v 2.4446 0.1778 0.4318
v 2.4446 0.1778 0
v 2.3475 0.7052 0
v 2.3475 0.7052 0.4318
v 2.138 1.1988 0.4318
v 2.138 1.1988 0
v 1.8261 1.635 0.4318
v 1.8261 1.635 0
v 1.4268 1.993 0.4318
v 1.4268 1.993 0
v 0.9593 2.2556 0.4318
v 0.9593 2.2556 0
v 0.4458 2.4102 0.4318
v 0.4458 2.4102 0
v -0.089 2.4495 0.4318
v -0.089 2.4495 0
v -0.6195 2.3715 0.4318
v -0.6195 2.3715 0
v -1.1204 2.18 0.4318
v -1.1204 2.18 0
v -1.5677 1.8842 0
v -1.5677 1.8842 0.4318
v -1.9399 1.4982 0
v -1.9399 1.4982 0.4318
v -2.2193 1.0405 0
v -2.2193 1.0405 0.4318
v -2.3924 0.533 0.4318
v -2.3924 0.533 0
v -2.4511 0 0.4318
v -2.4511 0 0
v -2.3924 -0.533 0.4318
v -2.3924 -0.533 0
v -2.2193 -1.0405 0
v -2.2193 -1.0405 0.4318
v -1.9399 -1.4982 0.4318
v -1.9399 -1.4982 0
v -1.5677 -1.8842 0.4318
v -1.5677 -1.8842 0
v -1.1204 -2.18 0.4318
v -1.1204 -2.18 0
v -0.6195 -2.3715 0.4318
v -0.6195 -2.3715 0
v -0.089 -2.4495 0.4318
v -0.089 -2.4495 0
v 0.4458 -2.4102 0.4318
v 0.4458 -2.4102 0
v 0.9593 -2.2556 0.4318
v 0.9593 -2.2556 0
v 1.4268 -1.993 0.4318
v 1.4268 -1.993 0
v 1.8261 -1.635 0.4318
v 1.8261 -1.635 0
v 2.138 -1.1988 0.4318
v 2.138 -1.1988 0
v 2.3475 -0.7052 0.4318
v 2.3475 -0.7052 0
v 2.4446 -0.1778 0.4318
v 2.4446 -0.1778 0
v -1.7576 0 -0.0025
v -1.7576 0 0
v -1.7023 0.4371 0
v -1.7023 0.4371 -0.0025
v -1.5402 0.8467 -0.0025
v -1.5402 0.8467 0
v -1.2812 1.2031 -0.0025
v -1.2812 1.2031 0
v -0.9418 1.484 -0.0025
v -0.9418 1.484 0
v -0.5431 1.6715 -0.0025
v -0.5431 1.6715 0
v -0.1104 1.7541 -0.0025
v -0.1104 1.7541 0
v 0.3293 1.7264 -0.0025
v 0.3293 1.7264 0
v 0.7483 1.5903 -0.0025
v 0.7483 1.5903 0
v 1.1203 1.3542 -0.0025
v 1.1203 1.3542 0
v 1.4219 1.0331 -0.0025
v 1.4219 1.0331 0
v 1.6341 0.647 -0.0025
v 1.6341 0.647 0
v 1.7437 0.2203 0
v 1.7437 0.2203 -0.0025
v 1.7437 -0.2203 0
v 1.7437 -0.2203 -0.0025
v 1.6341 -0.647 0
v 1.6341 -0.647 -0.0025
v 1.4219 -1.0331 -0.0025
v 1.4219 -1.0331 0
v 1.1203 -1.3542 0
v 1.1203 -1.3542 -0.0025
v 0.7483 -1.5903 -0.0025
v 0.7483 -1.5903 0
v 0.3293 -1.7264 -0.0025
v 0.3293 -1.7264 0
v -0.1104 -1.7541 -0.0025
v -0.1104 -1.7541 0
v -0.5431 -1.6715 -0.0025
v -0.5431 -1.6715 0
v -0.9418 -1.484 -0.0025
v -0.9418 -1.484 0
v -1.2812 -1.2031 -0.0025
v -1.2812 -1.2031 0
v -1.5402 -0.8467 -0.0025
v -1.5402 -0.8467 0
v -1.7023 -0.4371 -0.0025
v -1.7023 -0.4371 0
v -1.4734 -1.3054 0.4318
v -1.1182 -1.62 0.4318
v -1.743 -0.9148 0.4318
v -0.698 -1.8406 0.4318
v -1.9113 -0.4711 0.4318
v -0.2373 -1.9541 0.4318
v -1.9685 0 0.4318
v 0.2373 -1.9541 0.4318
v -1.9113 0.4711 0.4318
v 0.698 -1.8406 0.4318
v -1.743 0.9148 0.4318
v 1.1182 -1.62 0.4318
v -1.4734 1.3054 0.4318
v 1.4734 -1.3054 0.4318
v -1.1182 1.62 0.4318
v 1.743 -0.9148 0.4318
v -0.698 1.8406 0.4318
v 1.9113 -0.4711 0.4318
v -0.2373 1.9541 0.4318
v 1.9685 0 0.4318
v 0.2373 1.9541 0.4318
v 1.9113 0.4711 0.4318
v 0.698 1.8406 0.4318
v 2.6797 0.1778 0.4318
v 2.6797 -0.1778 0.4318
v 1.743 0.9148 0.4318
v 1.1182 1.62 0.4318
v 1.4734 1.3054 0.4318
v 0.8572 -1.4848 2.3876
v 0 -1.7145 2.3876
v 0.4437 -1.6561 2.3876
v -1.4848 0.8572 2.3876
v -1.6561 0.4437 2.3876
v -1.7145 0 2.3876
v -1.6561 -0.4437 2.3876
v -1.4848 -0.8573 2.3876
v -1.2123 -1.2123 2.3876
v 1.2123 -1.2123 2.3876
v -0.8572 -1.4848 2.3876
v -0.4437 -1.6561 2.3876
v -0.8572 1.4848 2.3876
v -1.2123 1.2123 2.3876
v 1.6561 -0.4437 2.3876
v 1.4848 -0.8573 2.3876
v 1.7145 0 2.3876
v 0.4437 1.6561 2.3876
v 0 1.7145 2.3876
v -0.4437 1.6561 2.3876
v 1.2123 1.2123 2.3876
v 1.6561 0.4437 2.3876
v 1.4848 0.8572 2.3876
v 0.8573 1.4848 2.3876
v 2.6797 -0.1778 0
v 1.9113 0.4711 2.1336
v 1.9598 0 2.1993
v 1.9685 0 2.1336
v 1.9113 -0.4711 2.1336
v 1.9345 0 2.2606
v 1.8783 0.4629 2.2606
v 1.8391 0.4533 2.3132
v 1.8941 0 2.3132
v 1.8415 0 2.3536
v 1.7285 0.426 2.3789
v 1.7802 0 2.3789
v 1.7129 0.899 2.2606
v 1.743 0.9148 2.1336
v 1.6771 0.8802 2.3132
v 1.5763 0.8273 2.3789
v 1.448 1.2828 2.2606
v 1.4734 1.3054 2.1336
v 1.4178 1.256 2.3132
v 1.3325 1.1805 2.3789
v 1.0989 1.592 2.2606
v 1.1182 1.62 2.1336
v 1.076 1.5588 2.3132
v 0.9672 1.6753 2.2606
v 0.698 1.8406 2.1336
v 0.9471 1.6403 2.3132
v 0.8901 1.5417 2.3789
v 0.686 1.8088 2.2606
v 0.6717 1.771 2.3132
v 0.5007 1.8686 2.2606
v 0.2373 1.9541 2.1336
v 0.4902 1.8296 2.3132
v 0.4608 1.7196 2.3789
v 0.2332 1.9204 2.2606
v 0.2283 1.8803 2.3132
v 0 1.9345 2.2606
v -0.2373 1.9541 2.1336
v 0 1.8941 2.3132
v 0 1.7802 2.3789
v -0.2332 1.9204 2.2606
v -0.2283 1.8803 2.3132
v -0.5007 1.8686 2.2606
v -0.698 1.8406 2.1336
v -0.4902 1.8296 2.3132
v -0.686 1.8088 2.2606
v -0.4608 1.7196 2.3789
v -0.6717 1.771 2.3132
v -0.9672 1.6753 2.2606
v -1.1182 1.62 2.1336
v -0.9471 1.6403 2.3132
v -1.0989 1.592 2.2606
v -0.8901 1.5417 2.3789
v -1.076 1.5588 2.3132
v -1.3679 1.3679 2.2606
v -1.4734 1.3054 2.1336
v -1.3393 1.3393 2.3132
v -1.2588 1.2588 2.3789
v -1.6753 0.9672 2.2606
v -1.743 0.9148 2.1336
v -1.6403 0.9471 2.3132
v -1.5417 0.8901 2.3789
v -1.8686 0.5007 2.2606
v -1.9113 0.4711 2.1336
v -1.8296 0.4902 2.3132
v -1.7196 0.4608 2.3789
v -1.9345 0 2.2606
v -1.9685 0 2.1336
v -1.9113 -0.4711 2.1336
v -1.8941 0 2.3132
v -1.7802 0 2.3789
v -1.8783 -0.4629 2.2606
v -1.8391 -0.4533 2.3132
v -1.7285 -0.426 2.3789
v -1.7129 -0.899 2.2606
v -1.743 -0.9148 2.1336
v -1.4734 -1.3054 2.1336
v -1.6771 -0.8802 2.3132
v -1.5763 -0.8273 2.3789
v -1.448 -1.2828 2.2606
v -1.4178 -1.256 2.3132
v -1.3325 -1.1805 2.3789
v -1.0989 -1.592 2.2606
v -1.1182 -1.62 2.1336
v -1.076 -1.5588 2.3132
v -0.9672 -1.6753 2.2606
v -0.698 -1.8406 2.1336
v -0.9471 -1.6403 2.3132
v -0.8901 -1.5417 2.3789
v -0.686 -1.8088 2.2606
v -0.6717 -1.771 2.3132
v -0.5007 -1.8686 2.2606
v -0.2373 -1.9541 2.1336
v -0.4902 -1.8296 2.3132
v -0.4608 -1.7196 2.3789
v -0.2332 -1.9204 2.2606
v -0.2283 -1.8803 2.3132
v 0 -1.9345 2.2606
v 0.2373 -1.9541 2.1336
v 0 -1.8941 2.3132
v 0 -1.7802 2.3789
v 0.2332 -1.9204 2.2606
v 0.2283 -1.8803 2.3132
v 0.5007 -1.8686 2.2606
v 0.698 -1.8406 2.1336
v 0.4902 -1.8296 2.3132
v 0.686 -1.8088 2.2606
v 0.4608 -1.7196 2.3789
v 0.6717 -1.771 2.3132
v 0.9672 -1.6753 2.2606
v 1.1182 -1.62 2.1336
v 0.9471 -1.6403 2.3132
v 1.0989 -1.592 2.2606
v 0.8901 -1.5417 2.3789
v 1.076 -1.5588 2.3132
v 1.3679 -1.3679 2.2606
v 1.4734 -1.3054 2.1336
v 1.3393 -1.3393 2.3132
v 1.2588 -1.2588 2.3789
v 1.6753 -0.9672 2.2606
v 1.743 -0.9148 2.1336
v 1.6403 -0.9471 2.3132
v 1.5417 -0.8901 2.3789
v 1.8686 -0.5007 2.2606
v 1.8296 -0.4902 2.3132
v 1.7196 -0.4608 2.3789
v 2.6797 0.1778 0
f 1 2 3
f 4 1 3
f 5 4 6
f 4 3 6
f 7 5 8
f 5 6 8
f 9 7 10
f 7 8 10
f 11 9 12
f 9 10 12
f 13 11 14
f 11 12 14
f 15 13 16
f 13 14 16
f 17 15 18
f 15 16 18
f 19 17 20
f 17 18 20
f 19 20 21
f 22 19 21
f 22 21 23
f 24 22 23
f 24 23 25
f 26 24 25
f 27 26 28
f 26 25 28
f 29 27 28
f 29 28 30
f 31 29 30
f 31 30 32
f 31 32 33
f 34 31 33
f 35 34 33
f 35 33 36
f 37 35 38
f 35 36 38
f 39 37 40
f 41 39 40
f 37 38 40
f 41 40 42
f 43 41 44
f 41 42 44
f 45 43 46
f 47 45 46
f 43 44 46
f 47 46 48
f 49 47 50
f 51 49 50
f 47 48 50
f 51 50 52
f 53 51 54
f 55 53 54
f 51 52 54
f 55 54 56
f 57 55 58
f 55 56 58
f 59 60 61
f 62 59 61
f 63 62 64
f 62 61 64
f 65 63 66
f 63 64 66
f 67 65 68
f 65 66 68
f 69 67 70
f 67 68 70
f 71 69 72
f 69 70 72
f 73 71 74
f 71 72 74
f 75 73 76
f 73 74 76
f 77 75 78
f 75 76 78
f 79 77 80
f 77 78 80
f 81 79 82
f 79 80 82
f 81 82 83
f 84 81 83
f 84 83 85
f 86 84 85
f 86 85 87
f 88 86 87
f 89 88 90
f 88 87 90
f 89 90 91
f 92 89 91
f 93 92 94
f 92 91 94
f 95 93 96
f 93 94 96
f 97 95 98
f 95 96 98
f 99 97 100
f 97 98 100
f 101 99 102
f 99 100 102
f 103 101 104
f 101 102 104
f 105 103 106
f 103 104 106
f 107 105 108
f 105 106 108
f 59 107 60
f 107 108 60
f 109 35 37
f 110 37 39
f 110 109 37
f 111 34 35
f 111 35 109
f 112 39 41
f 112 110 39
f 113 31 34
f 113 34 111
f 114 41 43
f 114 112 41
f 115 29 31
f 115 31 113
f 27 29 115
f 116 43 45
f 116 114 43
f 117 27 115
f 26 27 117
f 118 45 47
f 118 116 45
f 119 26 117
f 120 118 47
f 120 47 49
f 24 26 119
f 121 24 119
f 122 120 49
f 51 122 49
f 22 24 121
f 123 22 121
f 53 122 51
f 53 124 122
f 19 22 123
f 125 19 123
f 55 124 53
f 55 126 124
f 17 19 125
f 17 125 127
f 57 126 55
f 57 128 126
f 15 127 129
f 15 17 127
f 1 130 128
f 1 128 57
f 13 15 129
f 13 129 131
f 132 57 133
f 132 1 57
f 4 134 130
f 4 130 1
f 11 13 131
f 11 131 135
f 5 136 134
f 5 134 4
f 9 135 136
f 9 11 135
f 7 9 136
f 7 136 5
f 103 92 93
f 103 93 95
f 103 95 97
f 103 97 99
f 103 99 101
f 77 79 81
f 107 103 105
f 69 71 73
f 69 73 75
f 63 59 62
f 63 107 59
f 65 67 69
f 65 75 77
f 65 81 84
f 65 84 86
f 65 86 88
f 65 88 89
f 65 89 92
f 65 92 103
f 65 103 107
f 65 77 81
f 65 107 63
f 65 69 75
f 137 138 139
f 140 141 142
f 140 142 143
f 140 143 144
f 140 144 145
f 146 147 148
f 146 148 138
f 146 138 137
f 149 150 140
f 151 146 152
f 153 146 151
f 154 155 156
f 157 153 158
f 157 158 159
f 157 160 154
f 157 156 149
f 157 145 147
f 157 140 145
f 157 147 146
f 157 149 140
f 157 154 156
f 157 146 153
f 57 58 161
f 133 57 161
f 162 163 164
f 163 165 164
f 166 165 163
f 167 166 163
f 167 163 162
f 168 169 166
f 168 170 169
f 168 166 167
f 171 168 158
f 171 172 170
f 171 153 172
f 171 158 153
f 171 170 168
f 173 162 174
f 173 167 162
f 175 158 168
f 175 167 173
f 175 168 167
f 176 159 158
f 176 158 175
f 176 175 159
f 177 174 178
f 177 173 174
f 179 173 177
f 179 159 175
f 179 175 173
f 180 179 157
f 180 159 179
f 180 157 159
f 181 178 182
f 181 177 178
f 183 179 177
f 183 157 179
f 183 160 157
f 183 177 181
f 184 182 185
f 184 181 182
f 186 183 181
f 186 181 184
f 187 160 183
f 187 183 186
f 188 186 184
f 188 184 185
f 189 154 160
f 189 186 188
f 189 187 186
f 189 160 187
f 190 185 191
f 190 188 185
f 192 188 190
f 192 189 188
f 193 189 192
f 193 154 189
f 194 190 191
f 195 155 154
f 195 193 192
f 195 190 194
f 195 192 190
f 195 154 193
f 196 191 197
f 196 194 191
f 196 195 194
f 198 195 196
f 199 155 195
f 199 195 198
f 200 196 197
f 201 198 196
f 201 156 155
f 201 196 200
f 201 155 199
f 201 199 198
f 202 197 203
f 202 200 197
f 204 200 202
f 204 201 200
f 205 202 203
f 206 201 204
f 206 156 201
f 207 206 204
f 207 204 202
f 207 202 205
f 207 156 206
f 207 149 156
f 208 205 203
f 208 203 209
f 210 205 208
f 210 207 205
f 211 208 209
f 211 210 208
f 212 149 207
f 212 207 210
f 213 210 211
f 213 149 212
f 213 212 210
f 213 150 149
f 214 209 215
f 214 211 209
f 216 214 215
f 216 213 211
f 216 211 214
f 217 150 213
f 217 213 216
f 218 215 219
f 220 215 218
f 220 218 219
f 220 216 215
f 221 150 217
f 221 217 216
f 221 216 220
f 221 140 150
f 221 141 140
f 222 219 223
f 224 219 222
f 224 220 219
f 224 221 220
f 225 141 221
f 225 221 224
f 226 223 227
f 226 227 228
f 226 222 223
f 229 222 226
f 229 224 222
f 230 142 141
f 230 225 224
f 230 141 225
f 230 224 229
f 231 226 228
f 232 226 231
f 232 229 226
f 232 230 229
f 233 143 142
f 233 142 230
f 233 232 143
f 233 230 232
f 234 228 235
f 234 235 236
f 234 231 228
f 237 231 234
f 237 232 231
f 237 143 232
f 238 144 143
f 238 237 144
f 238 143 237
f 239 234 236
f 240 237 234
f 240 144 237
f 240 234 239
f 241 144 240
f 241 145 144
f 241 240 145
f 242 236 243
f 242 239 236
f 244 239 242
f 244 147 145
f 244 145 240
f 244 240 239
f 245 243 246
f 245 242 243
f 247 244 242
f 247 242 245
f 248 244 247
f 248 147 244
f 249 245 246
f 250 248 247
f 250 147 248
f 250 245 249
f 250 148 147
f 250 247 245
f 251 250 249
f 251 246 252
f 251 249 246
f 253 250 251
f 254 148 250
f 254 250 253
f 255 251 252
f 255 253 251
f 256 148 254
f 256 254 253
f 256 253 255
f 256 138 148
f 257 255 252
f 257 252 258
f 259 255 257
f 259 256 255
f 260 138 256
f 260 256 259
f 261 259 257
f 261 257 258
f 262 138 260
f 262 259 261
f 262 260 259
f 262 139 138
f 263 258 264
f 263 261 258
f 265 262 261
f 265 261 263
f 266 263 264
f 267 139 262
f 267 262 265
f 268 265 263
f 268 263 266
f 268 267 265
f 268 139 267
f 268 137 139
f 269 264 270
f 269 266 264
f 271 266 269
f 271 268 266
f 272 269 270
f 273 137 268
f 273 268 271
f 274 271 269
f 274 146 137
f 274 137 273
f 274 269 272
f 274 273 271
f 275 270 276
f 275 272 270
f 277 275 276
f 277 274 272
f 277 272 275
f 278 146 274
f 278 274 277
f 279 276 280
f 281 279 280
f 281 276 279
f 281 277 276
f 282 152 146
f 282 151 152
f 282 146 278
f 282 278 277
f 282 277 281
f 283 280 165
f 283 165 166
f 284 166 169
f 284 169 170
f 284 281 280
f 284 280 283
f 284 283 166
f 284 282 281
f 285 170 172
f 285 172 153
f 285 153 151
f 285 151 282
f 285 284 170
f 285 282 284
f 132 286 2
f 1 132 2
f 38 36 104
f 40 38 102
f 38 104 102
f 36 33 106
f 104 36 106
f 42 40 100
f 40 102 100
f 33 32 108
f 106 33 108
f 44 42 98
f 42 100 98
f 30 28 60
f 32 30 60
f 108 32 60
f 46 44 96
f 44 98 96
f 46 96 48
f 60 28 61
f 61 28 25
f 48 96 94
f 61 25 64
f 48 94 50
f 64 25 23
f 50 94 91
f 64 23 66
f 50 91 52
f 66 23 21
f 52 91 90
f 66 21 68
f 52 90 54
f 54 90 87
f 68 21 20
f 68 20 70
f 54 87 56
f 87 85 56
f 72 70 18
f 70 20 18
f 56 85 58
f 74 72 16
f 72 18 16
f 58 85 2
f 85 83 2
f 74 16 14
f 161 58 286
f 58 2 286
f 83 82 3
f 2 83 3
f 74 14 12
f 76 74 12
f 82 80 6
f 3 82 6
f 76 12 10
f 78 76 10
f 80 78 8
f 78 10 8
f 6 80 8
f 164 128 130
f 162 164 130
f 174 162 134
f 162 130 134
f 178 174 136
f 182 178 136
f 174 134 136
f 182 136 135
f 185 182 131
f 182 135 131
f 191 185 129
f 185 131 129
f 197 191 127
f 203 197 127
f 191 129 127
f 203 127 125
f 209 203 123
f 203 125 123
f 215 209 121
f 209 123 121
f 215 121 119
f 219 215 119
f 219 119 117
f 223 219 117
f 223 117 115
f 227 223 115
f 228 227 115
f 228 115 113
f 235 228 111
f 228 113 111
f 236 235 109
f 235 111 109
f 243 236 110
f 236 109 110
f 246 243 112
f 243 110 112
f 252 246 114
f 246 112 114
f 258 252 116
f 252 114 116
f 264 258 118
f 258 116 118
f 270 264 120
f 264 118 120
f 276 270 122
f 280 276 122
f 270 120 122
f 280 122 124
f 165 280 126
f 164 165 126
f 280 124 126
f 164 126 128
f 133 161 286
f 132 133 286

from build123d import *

# Parameters (mm, degrees)
BOSS_EXTRUDE1_DEPTH = 0.4318
SKETCH2_R           = 1.9685
BOSS_EXTRUDE2_DEPTH = 1.9558
SKETCH3_R           = 1.757566481
BOSS_EXTRUDE3_DEPTH = 0.00254
FILLET1_R           = 0.254


with BuildPart() as part:
    # Sketch1 → Boss-Extrude1 (new body)
    with BuildSketch(Plane.XY):
        with BuildLine():
            Line((2.6797, 0.1778), (2.4511, 0.1778))
            Line((2.4511, 0.1778), (2.44464279, 0.1778))
            ThreePointArc((2.44464279, 0.1778), (-2.4511, 0), (2.44464279, -0.1778))
            Line((2.44464279, -0.1778), (2.4511, -0.1778))
            Line((2.4511, -0.1778), (2.6797, -0.1778))
            Line((2.6797, -0.1778), (2.6797, 0.1778))
        make_face()
    extrude(amount=BOSS_EXTRUDE1_DEPTH)

    # Sketch2 → Boss-Extrude2 (add)
    with BuildSketch(Plane.XY.offset(0.4318)):
        Circle(SKETCH2_R)
    extrude(amount=BOSS_EXTRUDE2_DEPTH)

    # Sketch3 → Boss-Extrude3 (add)
    with BuildSketch(Plane(origin=(0, 0, 0), x_dir=(-1, 0, 0), z_dir=(0, 0, -1))):
        Circle(SKETCH3_R)
    extrude(amount=BOSS_EXTRUDE3_DEPTH)

    # Fillet1
    fillet1_edges = [part.edges().sort_by_distance(p)[0] for p in [
        (-1.9685, 0, 2.3876),
    ]]
    fillet(fillet1_edges, radius=FILLET1_R)


solid = part.part
